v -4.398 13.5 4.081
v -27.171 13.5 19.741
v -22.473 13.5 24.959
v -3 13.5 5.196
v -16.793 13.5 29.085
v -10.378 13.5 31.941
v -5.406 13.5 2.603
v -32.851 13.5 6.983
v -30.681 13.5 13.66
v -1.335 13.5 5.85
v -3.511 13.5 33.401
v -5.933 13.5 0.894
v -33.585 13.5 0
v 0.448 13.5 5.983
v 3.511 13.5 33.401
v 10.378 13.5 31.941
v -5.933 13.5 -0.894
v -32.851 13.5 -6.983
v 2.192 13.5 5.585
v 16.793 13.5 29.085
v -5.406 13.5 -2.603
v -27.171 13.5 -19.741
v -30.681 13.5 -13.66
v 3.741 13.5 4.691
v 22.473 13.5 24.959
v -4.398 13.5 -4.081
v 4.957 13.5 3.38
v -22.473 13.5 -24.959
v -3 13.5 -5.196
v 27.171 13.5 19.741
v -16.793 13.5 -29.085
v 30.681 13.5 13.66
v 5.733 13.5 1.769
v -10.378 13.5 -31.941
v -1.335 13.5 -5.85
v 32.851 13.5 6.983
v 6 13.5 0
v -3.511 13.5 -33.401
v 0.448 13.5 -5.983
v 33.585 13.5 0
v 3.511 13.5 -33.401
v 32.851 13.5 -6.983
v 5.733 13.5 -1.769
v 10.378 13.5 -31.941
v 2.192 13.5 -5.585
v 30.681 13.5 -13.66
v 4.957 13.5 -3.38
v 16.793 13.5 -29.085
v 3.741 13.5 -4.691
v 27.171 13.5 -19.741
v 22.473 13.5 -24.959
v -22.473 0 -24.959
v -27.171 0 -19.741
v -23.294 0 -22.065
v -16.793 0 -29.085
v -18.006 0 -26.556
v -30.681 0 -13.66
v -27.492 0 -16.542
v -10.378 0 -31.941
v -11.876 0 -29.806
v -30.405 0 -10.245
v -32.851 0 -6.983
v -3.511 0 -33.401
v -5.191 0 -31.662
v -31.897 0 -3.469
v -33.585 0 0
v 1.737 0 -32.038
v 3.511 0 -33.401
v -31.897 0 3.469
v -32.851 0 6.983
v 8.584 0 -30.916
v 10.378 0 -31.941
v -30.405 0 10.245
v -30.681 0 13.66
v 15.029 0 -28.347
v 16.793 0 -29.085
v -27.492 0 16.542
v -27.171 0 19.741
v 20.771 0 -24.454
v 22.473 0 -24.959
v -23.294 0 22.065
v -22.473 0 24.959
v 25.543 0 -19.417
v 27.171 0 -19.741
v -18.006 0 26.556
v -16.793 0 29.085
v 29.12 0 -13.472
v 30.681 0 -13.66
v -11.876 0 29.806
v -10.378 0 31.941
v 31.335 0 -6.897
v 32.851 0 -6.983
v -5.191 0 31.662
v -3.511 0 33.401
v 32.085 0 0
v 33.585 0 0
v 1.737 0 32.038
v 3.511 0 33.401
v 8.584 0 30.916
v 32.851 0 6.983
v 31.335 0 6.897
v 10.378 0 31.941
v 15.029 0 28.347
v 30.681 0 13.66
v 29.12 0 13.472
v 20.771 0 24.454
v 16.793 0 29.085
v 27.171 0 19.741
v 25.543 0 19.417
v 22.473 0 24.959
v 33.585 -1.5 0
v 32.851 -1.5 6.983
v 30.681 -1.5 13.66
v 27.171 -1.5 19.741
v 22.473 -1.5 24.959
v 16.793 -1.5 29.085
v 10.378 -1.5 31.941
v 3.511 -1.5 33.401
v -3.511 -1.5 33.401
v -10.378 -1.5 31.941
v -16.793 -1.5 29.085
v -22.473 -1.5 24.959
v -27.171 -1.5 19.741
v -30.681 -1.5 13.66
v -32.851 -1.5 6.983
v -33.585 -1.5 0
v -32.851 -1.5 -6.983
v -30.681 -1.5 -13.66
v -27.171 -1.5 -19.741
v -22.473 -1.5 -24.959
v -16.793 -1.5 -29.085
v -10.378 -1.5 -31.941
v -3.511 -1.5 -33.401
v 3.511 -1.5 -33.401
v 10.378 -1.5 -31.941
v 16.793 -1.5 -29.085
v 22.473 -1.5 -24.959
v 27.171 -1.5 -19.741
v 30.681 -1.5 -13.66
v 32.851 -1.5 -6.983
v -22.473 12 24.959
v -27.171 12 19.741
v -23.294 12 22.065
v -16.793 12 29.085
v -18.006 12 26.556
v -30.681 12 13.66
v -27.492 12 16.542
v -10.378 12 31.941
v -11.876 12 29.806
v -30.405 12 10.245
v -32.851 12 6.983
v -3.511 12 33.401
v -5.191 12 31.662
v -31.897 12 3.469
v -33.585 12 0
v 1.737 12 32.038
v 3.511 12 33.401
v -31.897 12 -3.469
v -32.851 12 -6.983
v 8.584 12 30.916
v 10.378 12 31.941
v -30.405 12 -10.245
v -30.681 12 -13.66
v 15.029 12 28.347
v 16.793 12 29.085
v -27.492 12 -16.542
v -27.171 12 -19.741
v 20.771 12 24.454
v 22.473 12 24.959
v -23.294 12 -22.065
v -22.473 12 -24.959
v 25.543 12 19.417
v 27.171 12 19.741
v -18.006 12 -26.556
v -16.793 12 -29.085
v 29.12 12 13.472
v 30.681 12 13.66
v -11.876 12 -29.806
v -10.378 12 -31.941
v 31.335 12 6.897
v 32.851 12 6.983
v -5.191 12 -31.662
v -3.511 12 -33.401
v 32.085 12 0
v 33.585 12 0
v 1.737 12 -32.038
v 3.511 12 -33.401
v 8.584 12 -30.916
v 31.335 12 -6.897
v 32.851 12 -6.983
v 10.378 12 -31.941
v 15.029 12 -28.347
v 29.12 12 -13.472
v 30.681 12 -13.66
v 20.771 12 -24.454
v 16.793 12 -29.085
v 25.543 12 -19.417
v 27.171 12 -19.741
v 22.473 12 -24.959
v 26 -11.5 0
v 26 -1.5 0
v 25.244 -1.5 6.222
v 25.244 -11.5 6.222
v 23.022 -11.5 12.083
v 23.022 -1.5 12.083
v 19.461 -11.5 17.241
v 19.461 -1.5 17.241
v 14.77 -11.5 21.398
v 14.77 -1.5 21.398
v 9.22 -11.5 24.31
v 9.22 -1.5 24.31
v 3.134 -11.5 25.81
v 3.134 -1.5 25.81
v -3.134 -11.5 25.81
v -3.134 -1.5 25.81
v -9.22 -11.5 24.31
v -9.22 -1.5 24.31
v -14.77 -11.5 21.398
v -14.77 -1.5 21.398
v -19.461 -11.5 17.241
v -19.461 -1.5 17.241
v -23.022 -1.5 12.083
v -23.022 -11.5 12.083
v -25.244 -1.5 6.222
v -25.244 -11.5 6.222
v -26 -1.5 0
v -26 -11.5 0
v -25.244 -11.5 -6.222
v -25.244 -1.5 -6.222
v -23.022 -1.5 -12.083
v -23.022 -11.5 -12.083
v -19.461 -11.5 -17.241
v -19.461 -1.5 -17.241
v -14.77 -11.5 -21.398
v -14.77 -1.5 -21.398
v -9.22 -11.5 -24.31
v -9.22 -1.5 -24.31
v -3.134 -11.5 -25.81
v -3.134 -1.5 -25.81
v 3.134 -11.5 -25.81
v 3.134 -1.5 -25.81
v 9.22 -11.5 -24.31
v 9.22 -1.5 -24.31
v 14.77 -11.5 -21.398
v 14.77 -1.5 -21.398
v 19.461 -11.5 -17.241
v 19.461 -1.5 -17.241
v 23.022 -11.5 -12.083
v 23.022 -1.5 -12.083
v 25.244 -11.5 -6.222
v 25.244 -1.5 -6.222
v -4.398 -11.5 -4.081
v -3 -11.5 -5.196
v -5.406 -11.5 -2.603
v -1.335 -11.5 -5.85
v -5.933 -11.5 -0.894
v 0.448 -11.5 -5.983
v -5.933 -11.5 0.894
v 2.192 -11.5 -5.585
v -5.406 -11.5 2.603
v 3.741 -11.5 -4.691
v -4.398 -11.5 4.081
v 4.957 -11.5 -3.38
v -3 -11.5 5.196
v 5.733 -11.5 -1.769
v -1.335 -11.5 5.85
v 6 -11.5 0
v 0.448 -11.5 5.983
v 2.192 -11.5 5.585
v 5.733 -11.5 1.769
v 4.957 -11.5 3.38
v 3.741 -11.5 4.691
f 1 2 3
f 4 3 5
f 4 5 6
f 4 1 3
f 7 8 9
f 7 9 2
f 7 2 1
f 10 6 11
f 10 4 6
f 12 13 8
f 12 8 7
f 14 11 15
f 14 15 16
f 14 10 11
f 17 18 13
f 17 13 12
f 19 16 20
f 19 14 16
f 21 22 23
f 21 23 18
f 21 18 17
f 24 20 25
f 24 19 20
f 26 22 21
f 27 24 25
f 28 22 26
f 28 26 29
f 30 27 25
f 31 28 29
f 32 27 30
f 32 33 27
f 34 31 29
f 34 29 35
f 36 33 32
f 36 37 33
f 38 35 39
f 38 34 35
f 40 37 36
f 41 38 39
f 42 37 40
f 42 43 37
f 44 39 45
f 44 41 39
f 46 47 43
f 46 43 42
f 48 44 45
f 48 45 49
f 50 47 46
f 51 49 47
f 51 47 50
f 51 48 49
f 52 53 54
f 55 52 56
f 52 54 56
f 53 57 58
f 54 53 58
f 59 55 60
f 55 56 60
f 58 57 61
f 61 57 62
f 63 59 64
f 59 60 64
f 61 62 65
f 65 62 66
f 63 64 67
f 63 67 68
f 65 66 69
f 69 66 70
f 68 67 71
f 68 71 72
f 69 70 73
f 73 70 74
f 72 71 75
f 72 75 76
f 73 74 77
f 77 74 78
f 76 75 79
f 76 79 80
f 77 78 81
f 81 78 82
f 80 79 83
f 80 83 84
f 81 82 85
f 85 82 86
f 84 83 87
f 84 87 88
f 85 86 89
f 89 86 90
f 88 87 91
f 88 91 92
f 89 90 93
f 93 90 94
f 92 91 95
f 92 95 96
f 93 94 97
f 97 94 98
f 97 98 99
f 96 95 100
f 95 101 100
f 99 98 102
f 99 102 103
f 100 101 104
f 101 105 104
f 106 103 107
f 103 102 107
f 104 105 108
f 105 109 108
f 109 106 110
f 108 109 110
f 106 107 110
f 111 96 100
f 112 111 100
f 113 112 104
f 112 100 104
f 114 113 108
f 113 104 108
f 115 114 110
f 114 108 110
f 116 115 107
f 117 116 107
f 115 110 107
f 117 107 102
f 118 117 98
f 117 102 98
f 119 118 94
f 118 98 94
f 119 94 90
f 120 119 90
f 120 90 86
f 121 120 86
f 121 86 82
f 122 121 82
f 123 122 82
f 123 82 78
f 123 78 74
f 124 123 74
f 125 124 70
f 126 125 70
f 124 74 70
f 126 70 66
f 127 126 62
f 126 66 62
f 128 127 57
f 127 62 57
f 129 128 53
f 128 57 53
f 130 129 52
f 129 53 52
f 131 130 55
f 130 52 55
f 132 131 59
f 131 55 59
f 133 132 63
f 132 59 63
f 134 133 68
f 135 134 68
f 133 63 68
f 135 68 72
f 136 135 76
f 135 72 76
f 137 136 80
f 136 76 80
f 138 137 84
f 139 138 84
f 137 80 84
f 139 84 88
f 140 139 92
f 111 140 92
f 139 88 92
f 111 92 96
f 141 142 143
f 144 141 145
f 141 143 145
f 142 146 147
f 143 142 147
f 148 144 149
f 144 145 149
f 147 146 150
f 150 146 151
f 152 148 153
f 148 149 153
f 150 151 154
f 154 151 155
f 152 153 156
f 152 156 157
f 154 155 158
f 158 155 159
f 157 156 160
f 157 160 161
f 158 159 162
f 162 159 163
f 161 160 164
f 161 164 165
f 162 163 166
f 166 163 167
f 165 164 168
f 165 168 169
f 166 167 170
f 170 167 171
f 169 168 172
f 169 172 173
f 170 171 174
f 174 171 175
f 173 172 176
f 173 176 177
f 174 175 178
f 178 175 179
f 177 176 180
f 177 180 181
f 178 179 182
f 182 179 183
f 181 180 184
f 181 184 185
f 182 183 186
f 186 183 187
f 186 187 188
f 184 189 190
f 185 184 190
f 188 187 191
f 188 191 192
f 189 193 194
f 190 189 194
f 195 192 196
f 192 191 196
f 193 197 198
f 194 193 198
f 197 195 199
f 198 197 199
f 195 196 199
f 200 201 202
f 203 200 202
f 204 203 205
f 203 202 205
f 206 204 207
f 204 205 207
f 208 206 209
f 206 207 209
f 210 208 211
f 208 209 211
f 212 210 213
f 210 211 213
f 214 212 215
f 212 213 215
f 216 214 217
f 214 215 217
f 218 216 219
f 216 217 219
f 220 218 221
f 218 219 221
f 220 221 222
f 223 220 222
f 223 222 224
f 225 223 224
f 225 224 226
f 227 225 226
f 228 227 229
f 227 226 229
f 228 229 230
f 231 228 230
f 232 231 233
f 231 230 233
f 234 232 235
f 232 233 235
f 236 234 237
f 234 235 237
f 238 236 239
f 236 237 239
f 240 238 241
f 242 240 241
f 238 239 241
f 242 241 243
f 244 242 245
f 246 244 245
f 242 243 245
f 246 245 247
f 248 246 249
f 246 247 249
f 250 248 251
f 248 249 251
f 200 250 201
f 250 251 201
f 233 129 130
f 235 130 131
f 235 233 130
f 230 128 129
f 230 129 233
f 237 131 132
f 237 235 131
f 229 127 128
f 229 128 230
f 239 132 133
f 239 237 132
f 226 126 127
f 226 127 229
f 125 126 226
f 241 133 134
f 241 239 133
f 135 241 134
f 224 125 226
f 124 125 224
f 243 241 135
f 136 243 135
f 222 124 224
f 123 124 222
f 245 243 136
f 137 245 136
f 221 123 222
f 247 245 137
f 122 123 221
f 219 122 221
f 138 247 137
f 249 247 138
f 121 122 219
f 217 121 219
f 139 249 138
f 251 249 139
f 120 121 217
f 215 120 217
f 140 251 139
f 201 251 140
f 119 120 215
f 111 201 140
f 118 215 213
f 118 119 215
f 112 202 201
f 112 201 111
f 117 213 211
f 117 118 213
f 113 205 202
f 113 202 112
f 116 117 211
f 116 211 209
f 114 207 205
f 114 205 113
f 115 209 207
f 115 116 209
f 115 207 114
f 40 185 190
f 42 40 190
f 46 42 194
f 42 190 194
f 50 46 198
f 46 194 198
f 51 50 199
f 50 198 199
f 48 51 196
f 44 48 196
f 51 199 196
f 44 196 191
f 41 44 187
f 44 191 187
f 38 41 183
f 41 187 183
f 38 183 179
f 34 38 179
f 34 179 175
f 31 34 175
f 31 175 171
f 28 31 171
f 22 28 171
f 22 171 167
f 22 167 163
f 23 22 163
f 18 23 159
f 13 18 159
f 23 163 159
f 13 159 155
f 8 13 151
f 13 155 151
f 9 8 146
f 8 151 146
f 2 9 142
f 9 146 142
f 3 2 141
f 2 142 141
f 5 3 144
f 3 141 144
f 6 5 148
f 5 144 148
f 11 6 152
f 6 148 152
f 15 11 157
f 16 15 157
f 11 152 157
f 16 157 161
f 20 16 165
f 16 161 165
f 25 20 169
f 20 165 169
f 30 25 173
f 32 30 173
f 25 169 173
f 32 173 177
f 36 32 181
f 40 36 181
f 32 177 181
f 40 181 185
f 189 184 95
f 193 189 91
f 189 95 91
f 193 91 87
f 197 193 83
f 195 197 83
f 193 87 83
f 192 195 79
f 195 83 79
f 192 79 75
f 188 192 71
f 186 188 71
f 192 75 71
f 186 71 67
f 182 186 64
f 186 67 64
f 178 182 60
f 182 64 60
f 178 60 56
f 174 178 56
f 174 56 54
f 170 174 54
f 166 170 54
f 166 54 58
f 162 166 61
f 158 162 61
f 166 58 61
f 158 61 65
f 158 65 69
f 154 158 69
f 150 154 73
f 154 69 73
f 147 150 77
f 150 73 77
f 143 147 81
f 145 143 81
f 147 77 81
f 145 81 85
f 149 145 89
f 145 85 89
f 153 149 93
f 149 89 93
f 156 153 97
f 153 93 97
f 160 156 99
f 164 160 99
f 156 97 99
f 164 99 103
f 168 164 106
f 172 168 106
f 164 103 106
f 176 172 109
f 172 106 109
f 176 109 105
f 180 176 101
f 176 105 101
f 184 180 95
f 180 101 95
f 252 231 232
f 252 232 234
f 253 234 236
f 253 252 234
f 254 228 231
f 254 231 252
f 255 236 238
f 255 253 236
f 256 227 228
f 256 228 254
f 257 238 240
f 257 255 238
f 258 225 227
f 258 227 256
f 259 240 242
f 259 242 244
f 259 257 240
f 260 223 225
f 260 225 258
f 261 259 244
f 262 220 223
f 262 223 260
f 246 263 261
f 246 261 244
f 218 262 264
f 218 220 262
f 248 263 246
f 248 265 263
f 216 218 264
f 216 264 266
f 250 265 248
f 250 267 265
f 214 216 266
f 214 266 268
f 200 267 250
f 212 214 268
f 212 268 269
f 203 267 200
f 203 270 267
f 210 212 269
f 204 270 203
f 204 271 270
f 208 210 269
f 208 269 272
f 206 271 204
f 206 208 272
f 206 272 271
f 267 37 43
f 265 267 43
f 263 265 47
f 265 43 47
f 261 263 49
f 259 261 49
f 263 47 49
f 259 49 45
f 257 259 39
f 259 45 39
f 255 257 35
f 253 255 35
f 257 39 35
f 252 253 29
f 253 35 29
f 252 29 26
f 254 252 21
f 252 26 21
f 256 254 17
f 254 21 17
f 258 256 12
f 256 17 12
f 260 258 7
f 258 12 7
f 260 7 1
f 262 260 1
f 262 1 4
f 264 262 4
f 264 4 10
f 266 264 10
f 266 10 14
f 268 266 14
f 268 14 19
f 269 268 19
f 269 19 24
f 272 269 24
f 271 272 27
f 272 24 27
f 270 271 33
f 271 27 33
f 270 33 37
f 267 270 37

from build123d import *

# Parameters (mm, degrees)
SKETCH1_R           = 32.085
BOSS_EXTRUDE1_DEPTH = 12
SKETCH3_R           = 33.585
BOSS_EXTRUDE3_DEPTH = 1.5
SKETCH4_R           = 33.585
BOSS_EXTRUDE4_DEPTH = 1.5
SKETCH5_R           = 26
BOSS_EXTRUDE5_DEPTH = 10
SKETCH6_R           = 6
CUT_EXTRUDE1_DEPTH  = 25


with BuildPart() as part:
    # Sketch1 → Boss-Extrude1 (new body)
    with BuildSketch(Plane(origin=(0, 0, 0), x_dir=(1, 0, 0), z_dir=(0, 1, 0))):
        Circle(SKETCH1_R)
    extrude(amount=BOSS_EXTRUDE1_DEPTH)

    # Sketch3 → Boss-Extrude3 (add)
    with BuildSketch(Plane(origin=(0, 12, 0), x_dir=(1, 0, 0), z_dir=(0, 1, 0))):
        Circle(SKETCH3_R)
    extrude(amount=BOSS_EXTRUDE3_DEPTH)

    # Sketch4 → Boss-Extrude4 (add)
    with BuildSketch(Plane.XZ):
        Circle(SKETCH4_R)
    extrude(amount=BOSS_EXTRUDE4_DEPTH)

    # Sketch5 → Boss-Extrude5 (add)
    with BuildSketch(Plane.XZ.offset(1.5)):
        Circle(SKETCH5_R)
    extrude(amount=BOSS_EXTRUDE5_DEPTH)

    # Sketch6 → Cut-Extrude1 (cut)
    with BuildSketch(Plane(origin=(0, 13.5, 0), x_dir=(1, 0, 0), z_dir=(0, 1, 0))):
        Circle(SKETCH6_R)
    extrude(amount=-CUT_EXTRUDE1_DEPTH, mode=Mode.SUBTRACT)


solid = part.part
